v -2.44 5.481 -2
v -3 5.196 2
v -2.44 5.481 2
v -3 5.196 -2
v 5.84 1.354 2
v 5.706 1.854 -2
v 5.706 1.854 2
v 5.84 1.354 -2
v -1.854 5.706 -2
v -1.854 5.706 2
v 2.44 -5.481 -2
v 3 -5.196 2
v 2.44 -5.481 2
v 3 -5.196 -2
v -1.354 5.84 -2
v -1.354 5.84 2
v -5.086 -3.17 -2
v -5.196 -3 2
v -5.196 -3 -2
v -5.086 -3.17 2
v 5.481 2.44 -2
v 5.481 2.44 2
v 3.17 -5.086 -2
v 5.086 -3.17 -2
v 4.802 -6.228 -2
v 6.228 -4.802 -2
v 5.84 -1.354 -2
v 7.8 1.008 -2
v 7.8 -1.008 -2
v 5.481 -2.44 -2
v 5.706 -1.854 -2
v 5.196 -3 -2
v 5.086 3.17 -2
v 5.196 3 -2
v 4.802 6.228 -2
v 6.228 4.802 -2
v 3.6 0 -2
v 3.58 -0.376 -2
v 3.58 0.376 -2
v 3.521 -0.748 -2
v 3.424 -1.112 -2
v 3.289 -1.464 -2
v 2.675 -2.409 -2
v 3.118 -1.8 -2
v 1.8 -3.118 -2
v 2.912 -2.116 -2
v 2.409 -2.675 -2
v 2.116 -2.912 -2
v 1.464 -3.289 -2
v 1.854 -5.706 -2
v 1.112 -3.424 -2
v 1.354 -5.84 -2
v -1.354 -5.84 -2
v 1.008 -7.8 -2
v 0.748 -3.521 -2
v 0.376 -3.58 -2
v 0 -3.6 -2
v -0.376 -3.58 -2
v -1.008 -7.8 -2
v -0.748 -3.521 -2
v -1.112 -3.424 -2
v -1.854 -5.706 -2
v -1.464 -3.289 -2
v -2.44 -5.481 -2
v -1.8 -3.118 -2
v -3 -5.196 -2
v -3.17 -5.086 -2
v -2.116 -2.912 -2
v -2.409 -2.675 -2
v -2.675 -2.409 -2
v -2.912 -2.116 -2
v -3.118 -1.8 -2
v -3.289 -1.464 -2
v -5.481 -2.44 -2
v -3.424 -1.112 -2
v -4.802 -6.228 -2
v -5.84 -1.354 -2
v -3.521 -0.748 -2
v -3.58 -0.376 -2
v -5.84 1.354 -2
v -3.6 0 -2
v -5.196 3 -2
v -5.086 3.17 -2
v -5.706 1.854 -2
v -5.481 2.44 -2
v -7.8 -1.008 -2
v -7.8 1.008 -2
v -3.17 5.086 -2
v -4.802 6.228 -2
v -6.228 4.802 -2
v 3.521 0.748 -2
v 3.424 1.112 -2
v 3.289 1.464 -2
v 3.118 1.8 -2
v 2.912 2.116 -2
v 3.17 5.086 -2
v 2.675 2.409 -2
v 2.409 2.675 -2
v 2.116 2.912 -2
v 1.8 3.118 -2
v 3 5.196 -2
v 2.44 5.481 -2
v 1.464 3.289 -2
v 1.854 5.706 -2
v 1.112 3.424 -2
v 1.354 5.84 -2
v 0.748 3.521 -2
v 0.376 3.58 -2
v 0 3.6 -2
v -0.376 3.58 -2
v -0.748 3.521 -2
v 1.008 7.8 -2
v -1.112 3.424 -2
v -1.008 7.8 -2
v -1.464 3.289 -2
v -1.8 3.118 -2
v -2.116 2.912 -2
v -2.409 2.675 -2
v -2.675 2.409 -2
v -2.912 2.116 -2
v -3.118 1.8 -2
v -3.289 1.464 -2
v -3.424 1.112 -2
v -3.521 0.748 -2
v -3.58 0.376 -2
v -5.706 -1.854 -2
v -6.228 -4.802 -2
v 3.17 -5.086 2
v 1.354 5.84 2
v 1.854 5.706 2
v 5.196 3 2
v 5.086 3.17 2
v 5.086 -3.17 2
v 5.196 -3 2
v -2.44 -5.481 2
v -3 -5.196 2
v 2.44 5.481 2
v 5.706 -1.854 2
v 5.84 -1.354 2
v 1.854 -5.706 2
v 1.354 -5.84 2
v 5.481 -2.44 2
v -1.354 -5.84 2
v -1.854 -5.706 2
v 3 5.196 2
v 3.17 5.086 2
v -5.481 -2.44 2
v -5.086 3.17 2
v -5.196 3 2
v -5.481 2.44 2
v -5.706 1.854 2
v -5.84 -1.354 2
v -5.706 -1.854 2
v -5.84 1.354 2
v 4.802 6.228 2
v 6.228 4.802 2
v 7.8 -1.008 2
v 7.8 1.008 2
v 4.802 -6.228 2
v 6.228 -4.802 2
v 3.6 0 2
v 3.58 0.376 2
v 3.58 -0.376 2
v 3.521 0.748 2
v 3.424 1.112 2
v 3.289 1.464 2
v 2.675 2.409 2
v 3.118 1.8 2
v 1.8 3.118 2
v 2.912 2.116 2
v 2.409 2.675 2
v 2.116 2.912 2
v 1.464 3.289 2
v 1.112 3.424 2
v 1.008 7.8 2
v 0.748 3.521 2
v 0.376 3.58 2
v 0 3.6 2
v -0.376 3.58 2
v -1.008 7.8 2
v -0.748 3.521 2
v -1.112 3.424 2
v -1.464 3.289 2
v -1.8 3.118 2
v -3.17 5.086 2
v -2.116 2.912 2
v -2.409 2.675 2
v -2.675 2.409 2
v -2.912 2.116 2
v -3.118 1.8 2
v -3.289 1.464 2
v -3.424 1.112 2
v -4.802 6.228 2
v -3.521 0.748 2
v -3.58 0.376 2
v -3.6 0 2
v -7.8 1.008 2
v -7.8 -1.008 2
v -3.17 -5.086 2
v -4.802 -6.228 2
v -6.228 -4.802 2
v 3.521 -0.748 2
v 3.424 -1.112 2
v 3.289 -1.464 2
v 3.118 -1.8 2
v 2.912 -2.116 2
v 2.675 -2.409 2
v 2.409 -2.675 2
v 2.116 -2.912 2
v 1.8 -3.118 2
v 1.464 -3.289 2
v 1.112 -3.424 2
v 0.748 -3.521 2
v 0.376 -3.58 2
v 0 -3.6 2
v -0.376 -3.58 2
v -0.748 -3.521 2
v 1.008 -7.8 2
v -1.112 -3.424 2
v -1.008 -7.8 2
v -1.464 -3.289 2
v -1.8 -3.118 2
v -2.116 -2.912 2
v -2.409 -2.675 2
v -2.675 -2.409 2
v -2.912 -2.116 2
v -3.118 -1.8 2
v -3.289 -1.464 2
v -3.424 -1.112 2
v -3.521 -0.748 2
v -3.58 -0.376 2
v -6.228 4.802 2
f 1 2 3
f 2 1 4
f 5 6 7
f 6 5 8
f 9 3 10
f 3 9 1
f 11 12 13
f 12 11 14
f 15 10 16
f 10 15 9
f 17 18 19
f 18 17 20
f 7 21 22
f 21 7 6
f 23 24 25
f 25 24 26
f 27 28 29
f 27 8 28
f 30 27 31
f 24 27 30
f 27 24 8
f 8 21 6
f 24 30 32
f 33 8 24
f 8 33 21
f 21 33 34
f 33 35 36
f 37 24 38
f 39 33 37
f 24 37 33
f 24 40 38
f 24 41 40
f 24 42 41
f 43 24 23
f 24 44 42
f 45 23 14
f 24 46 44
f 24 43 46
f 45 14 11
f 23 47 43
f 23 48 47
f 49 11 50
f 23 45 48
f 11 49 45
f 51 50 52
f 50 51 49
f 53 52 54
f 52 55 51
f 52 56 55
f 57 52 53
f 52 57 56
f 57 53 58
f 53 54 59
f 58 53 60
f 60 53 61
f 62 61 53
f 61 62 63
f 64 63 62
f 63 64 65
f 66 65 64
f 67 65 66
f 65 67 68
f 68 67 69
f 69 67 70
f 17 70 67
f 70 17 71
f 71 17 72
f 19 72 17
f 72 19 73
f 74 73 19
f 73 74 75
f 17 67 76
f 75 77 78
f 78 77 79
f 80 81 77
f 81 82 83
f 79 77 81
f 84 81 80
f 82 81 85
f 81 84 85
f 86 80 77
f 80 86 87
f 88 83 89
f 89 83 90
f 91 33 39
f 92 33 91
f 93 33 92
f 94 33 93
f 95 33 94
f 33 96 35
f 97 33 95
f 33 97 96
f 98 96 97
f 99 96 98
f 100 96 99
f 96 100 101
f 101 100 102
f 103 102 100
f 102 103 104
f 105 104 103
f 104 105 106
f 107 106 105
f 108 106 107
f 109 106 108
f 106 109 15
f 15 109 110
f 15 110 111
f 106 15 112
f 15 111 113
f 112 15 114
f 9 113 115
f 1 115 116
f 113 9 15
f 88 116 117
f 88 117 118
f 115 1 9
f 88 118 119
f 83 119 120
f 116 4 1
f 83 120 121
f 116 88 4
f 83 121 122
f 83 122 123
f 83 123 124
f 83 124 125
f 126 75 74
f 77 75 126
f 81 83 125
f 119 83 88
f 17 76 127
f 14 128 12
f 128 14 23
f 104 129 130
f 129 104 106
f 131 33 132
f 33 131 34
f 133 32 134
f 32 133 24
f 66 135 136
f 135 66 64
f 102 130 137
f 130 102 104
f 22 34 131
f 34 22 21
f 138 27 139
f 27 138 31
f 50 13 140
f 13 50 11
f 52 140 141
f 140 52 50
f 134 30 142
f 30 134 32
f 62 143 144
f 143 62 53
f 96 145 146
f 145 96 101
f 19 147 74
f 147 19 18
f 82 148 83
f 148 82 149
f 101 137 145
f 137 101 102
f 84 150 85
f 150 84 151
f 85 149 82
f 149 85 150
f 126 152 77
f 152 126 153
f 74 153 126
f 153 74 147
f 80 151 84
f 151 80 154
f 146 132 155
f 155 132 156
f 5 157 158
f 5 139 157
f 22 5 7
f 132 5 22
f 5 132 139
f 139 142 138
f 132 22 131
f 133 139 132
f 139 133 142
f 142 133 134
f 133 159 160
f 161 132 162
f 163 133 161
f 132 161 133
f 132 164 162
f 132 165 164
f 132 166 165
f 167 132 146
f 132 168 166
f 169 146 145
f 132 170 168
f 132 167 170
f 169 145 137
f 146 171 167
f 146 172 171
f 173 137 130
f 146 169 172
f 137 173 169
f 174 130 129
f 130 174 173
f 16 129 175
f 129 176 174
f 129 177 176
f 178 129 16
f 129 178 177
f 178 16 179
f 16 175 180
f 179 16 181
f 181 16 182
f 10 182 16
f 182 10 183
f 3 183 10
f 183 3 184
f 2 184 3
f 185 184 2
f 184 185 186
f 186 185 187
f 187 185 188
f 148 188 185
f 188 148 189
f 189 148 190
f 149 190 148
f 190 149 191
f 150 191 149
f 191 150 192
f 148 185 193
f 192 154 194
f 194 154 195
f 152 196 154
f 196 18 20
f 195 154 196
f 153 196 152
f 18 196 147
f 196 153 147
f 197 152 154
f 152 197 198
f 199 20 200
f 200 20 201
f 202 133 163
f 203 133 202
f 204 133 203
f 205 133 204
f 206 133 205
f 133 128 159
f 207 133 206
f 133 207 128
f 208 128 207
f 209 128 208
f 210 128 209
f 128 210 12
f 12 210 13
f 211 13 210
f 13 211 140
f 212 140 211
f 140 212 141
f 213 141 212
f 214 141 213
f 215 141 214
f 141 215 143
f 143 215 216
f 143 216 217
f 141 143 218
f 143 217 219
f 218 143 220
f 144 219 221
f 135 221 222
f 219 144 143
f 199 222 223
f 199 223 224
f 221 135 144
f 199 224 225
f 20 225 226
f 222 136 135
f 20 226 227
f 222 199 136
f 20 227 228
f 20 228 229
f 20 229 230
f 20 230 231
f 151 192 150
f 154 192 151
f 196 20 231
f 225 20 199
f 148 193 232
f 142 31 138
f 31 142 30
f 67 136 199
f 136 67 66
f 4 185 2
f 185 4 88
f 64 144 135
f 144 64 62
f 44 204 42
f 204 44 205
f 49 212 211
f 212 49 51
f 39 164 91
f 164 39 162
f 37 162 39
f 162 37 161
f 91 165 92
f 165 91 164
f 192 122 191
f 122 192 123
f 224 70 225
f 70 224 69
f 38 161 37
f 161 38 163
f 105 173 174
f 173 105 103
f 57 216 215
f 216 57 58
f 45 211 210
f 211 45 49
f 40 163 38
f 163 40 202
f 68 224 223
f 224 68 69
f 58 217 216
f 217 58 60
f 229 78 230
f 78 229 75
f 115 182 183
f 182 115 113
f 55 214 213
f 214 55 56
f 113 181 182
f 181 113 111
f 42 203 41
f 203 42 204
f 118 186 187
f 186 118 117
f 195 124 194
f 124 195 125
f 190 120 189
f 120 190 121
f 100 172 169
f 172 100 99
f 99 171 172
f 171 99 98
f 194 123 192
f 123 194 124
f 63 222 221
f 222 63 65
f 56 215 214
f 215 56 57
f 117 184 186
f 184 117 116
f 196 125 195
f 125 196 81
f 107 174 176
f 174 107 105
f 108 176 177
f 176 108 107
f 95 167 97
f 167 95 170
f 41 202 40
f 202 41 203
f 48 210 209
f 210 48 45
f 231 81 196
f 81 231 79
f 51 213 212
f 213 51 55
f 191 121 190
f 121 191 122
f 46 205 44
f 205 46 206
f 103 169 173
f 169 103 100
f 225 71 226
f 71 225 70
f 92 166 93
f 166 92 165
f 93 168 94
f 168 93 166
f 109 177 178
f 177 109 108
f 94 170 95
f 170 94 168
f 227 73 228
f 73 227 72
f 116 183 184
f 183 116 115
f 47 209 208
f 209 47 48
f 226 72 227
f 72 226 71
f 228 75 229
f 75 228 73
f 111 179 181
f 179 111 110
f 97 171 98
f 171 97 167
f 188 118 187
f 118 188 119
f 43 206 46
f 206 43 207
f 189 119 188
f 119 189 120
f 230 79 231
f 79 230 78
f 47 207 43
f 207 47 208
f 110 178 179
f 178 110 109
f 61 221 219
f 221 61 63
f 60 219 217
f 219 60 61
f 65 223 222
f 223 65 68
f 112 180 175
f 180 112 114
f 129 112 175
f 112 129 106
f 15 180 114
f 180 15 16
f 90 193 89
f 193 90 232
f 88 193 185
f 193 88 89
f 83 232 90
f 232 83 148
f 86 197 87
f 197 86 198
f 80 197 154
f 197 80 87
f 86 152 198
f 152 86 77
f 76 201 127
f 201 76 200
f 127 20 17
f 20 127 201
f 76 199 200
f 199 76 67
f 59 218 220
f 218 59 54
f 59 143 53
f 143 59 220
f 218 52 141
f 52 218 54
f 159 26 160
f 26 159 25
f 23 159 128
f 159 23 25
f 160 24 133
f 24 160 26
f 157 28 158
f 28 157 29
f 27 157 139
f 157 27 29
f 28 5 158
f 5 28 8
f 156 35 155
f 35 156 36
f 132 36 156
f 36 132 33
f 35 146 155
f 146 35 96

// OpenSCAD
module OpenSessionPanelIcon() {
  ht  = 4;
  rad = 6;
  module Tooth_() {
    module Differ_(plus_minus) {
      translate([plus_minus * 2.2, 0, 0])
        rotate([0, 0, plus_minus * 10])
        cube([2, 4, 2 * ht], center = true);
    }
    difference() {
      cube([3, 2, ht], center = true);
      Differ_(1);
      Differ_(-1);
    }
  }

  difference() {
    cylinder(h = ht,     r = rad,      center = true);
    cylinder(h = 2 * ht, r = .6 * rad, center = true);
  }
  for (i = [0:7]) {
    rotate([0, 0, 45 * i]) translate([0, 6.8, 0]) Tooth_();
  }
}

OpenSessionPanelIcon($fn = 60);
